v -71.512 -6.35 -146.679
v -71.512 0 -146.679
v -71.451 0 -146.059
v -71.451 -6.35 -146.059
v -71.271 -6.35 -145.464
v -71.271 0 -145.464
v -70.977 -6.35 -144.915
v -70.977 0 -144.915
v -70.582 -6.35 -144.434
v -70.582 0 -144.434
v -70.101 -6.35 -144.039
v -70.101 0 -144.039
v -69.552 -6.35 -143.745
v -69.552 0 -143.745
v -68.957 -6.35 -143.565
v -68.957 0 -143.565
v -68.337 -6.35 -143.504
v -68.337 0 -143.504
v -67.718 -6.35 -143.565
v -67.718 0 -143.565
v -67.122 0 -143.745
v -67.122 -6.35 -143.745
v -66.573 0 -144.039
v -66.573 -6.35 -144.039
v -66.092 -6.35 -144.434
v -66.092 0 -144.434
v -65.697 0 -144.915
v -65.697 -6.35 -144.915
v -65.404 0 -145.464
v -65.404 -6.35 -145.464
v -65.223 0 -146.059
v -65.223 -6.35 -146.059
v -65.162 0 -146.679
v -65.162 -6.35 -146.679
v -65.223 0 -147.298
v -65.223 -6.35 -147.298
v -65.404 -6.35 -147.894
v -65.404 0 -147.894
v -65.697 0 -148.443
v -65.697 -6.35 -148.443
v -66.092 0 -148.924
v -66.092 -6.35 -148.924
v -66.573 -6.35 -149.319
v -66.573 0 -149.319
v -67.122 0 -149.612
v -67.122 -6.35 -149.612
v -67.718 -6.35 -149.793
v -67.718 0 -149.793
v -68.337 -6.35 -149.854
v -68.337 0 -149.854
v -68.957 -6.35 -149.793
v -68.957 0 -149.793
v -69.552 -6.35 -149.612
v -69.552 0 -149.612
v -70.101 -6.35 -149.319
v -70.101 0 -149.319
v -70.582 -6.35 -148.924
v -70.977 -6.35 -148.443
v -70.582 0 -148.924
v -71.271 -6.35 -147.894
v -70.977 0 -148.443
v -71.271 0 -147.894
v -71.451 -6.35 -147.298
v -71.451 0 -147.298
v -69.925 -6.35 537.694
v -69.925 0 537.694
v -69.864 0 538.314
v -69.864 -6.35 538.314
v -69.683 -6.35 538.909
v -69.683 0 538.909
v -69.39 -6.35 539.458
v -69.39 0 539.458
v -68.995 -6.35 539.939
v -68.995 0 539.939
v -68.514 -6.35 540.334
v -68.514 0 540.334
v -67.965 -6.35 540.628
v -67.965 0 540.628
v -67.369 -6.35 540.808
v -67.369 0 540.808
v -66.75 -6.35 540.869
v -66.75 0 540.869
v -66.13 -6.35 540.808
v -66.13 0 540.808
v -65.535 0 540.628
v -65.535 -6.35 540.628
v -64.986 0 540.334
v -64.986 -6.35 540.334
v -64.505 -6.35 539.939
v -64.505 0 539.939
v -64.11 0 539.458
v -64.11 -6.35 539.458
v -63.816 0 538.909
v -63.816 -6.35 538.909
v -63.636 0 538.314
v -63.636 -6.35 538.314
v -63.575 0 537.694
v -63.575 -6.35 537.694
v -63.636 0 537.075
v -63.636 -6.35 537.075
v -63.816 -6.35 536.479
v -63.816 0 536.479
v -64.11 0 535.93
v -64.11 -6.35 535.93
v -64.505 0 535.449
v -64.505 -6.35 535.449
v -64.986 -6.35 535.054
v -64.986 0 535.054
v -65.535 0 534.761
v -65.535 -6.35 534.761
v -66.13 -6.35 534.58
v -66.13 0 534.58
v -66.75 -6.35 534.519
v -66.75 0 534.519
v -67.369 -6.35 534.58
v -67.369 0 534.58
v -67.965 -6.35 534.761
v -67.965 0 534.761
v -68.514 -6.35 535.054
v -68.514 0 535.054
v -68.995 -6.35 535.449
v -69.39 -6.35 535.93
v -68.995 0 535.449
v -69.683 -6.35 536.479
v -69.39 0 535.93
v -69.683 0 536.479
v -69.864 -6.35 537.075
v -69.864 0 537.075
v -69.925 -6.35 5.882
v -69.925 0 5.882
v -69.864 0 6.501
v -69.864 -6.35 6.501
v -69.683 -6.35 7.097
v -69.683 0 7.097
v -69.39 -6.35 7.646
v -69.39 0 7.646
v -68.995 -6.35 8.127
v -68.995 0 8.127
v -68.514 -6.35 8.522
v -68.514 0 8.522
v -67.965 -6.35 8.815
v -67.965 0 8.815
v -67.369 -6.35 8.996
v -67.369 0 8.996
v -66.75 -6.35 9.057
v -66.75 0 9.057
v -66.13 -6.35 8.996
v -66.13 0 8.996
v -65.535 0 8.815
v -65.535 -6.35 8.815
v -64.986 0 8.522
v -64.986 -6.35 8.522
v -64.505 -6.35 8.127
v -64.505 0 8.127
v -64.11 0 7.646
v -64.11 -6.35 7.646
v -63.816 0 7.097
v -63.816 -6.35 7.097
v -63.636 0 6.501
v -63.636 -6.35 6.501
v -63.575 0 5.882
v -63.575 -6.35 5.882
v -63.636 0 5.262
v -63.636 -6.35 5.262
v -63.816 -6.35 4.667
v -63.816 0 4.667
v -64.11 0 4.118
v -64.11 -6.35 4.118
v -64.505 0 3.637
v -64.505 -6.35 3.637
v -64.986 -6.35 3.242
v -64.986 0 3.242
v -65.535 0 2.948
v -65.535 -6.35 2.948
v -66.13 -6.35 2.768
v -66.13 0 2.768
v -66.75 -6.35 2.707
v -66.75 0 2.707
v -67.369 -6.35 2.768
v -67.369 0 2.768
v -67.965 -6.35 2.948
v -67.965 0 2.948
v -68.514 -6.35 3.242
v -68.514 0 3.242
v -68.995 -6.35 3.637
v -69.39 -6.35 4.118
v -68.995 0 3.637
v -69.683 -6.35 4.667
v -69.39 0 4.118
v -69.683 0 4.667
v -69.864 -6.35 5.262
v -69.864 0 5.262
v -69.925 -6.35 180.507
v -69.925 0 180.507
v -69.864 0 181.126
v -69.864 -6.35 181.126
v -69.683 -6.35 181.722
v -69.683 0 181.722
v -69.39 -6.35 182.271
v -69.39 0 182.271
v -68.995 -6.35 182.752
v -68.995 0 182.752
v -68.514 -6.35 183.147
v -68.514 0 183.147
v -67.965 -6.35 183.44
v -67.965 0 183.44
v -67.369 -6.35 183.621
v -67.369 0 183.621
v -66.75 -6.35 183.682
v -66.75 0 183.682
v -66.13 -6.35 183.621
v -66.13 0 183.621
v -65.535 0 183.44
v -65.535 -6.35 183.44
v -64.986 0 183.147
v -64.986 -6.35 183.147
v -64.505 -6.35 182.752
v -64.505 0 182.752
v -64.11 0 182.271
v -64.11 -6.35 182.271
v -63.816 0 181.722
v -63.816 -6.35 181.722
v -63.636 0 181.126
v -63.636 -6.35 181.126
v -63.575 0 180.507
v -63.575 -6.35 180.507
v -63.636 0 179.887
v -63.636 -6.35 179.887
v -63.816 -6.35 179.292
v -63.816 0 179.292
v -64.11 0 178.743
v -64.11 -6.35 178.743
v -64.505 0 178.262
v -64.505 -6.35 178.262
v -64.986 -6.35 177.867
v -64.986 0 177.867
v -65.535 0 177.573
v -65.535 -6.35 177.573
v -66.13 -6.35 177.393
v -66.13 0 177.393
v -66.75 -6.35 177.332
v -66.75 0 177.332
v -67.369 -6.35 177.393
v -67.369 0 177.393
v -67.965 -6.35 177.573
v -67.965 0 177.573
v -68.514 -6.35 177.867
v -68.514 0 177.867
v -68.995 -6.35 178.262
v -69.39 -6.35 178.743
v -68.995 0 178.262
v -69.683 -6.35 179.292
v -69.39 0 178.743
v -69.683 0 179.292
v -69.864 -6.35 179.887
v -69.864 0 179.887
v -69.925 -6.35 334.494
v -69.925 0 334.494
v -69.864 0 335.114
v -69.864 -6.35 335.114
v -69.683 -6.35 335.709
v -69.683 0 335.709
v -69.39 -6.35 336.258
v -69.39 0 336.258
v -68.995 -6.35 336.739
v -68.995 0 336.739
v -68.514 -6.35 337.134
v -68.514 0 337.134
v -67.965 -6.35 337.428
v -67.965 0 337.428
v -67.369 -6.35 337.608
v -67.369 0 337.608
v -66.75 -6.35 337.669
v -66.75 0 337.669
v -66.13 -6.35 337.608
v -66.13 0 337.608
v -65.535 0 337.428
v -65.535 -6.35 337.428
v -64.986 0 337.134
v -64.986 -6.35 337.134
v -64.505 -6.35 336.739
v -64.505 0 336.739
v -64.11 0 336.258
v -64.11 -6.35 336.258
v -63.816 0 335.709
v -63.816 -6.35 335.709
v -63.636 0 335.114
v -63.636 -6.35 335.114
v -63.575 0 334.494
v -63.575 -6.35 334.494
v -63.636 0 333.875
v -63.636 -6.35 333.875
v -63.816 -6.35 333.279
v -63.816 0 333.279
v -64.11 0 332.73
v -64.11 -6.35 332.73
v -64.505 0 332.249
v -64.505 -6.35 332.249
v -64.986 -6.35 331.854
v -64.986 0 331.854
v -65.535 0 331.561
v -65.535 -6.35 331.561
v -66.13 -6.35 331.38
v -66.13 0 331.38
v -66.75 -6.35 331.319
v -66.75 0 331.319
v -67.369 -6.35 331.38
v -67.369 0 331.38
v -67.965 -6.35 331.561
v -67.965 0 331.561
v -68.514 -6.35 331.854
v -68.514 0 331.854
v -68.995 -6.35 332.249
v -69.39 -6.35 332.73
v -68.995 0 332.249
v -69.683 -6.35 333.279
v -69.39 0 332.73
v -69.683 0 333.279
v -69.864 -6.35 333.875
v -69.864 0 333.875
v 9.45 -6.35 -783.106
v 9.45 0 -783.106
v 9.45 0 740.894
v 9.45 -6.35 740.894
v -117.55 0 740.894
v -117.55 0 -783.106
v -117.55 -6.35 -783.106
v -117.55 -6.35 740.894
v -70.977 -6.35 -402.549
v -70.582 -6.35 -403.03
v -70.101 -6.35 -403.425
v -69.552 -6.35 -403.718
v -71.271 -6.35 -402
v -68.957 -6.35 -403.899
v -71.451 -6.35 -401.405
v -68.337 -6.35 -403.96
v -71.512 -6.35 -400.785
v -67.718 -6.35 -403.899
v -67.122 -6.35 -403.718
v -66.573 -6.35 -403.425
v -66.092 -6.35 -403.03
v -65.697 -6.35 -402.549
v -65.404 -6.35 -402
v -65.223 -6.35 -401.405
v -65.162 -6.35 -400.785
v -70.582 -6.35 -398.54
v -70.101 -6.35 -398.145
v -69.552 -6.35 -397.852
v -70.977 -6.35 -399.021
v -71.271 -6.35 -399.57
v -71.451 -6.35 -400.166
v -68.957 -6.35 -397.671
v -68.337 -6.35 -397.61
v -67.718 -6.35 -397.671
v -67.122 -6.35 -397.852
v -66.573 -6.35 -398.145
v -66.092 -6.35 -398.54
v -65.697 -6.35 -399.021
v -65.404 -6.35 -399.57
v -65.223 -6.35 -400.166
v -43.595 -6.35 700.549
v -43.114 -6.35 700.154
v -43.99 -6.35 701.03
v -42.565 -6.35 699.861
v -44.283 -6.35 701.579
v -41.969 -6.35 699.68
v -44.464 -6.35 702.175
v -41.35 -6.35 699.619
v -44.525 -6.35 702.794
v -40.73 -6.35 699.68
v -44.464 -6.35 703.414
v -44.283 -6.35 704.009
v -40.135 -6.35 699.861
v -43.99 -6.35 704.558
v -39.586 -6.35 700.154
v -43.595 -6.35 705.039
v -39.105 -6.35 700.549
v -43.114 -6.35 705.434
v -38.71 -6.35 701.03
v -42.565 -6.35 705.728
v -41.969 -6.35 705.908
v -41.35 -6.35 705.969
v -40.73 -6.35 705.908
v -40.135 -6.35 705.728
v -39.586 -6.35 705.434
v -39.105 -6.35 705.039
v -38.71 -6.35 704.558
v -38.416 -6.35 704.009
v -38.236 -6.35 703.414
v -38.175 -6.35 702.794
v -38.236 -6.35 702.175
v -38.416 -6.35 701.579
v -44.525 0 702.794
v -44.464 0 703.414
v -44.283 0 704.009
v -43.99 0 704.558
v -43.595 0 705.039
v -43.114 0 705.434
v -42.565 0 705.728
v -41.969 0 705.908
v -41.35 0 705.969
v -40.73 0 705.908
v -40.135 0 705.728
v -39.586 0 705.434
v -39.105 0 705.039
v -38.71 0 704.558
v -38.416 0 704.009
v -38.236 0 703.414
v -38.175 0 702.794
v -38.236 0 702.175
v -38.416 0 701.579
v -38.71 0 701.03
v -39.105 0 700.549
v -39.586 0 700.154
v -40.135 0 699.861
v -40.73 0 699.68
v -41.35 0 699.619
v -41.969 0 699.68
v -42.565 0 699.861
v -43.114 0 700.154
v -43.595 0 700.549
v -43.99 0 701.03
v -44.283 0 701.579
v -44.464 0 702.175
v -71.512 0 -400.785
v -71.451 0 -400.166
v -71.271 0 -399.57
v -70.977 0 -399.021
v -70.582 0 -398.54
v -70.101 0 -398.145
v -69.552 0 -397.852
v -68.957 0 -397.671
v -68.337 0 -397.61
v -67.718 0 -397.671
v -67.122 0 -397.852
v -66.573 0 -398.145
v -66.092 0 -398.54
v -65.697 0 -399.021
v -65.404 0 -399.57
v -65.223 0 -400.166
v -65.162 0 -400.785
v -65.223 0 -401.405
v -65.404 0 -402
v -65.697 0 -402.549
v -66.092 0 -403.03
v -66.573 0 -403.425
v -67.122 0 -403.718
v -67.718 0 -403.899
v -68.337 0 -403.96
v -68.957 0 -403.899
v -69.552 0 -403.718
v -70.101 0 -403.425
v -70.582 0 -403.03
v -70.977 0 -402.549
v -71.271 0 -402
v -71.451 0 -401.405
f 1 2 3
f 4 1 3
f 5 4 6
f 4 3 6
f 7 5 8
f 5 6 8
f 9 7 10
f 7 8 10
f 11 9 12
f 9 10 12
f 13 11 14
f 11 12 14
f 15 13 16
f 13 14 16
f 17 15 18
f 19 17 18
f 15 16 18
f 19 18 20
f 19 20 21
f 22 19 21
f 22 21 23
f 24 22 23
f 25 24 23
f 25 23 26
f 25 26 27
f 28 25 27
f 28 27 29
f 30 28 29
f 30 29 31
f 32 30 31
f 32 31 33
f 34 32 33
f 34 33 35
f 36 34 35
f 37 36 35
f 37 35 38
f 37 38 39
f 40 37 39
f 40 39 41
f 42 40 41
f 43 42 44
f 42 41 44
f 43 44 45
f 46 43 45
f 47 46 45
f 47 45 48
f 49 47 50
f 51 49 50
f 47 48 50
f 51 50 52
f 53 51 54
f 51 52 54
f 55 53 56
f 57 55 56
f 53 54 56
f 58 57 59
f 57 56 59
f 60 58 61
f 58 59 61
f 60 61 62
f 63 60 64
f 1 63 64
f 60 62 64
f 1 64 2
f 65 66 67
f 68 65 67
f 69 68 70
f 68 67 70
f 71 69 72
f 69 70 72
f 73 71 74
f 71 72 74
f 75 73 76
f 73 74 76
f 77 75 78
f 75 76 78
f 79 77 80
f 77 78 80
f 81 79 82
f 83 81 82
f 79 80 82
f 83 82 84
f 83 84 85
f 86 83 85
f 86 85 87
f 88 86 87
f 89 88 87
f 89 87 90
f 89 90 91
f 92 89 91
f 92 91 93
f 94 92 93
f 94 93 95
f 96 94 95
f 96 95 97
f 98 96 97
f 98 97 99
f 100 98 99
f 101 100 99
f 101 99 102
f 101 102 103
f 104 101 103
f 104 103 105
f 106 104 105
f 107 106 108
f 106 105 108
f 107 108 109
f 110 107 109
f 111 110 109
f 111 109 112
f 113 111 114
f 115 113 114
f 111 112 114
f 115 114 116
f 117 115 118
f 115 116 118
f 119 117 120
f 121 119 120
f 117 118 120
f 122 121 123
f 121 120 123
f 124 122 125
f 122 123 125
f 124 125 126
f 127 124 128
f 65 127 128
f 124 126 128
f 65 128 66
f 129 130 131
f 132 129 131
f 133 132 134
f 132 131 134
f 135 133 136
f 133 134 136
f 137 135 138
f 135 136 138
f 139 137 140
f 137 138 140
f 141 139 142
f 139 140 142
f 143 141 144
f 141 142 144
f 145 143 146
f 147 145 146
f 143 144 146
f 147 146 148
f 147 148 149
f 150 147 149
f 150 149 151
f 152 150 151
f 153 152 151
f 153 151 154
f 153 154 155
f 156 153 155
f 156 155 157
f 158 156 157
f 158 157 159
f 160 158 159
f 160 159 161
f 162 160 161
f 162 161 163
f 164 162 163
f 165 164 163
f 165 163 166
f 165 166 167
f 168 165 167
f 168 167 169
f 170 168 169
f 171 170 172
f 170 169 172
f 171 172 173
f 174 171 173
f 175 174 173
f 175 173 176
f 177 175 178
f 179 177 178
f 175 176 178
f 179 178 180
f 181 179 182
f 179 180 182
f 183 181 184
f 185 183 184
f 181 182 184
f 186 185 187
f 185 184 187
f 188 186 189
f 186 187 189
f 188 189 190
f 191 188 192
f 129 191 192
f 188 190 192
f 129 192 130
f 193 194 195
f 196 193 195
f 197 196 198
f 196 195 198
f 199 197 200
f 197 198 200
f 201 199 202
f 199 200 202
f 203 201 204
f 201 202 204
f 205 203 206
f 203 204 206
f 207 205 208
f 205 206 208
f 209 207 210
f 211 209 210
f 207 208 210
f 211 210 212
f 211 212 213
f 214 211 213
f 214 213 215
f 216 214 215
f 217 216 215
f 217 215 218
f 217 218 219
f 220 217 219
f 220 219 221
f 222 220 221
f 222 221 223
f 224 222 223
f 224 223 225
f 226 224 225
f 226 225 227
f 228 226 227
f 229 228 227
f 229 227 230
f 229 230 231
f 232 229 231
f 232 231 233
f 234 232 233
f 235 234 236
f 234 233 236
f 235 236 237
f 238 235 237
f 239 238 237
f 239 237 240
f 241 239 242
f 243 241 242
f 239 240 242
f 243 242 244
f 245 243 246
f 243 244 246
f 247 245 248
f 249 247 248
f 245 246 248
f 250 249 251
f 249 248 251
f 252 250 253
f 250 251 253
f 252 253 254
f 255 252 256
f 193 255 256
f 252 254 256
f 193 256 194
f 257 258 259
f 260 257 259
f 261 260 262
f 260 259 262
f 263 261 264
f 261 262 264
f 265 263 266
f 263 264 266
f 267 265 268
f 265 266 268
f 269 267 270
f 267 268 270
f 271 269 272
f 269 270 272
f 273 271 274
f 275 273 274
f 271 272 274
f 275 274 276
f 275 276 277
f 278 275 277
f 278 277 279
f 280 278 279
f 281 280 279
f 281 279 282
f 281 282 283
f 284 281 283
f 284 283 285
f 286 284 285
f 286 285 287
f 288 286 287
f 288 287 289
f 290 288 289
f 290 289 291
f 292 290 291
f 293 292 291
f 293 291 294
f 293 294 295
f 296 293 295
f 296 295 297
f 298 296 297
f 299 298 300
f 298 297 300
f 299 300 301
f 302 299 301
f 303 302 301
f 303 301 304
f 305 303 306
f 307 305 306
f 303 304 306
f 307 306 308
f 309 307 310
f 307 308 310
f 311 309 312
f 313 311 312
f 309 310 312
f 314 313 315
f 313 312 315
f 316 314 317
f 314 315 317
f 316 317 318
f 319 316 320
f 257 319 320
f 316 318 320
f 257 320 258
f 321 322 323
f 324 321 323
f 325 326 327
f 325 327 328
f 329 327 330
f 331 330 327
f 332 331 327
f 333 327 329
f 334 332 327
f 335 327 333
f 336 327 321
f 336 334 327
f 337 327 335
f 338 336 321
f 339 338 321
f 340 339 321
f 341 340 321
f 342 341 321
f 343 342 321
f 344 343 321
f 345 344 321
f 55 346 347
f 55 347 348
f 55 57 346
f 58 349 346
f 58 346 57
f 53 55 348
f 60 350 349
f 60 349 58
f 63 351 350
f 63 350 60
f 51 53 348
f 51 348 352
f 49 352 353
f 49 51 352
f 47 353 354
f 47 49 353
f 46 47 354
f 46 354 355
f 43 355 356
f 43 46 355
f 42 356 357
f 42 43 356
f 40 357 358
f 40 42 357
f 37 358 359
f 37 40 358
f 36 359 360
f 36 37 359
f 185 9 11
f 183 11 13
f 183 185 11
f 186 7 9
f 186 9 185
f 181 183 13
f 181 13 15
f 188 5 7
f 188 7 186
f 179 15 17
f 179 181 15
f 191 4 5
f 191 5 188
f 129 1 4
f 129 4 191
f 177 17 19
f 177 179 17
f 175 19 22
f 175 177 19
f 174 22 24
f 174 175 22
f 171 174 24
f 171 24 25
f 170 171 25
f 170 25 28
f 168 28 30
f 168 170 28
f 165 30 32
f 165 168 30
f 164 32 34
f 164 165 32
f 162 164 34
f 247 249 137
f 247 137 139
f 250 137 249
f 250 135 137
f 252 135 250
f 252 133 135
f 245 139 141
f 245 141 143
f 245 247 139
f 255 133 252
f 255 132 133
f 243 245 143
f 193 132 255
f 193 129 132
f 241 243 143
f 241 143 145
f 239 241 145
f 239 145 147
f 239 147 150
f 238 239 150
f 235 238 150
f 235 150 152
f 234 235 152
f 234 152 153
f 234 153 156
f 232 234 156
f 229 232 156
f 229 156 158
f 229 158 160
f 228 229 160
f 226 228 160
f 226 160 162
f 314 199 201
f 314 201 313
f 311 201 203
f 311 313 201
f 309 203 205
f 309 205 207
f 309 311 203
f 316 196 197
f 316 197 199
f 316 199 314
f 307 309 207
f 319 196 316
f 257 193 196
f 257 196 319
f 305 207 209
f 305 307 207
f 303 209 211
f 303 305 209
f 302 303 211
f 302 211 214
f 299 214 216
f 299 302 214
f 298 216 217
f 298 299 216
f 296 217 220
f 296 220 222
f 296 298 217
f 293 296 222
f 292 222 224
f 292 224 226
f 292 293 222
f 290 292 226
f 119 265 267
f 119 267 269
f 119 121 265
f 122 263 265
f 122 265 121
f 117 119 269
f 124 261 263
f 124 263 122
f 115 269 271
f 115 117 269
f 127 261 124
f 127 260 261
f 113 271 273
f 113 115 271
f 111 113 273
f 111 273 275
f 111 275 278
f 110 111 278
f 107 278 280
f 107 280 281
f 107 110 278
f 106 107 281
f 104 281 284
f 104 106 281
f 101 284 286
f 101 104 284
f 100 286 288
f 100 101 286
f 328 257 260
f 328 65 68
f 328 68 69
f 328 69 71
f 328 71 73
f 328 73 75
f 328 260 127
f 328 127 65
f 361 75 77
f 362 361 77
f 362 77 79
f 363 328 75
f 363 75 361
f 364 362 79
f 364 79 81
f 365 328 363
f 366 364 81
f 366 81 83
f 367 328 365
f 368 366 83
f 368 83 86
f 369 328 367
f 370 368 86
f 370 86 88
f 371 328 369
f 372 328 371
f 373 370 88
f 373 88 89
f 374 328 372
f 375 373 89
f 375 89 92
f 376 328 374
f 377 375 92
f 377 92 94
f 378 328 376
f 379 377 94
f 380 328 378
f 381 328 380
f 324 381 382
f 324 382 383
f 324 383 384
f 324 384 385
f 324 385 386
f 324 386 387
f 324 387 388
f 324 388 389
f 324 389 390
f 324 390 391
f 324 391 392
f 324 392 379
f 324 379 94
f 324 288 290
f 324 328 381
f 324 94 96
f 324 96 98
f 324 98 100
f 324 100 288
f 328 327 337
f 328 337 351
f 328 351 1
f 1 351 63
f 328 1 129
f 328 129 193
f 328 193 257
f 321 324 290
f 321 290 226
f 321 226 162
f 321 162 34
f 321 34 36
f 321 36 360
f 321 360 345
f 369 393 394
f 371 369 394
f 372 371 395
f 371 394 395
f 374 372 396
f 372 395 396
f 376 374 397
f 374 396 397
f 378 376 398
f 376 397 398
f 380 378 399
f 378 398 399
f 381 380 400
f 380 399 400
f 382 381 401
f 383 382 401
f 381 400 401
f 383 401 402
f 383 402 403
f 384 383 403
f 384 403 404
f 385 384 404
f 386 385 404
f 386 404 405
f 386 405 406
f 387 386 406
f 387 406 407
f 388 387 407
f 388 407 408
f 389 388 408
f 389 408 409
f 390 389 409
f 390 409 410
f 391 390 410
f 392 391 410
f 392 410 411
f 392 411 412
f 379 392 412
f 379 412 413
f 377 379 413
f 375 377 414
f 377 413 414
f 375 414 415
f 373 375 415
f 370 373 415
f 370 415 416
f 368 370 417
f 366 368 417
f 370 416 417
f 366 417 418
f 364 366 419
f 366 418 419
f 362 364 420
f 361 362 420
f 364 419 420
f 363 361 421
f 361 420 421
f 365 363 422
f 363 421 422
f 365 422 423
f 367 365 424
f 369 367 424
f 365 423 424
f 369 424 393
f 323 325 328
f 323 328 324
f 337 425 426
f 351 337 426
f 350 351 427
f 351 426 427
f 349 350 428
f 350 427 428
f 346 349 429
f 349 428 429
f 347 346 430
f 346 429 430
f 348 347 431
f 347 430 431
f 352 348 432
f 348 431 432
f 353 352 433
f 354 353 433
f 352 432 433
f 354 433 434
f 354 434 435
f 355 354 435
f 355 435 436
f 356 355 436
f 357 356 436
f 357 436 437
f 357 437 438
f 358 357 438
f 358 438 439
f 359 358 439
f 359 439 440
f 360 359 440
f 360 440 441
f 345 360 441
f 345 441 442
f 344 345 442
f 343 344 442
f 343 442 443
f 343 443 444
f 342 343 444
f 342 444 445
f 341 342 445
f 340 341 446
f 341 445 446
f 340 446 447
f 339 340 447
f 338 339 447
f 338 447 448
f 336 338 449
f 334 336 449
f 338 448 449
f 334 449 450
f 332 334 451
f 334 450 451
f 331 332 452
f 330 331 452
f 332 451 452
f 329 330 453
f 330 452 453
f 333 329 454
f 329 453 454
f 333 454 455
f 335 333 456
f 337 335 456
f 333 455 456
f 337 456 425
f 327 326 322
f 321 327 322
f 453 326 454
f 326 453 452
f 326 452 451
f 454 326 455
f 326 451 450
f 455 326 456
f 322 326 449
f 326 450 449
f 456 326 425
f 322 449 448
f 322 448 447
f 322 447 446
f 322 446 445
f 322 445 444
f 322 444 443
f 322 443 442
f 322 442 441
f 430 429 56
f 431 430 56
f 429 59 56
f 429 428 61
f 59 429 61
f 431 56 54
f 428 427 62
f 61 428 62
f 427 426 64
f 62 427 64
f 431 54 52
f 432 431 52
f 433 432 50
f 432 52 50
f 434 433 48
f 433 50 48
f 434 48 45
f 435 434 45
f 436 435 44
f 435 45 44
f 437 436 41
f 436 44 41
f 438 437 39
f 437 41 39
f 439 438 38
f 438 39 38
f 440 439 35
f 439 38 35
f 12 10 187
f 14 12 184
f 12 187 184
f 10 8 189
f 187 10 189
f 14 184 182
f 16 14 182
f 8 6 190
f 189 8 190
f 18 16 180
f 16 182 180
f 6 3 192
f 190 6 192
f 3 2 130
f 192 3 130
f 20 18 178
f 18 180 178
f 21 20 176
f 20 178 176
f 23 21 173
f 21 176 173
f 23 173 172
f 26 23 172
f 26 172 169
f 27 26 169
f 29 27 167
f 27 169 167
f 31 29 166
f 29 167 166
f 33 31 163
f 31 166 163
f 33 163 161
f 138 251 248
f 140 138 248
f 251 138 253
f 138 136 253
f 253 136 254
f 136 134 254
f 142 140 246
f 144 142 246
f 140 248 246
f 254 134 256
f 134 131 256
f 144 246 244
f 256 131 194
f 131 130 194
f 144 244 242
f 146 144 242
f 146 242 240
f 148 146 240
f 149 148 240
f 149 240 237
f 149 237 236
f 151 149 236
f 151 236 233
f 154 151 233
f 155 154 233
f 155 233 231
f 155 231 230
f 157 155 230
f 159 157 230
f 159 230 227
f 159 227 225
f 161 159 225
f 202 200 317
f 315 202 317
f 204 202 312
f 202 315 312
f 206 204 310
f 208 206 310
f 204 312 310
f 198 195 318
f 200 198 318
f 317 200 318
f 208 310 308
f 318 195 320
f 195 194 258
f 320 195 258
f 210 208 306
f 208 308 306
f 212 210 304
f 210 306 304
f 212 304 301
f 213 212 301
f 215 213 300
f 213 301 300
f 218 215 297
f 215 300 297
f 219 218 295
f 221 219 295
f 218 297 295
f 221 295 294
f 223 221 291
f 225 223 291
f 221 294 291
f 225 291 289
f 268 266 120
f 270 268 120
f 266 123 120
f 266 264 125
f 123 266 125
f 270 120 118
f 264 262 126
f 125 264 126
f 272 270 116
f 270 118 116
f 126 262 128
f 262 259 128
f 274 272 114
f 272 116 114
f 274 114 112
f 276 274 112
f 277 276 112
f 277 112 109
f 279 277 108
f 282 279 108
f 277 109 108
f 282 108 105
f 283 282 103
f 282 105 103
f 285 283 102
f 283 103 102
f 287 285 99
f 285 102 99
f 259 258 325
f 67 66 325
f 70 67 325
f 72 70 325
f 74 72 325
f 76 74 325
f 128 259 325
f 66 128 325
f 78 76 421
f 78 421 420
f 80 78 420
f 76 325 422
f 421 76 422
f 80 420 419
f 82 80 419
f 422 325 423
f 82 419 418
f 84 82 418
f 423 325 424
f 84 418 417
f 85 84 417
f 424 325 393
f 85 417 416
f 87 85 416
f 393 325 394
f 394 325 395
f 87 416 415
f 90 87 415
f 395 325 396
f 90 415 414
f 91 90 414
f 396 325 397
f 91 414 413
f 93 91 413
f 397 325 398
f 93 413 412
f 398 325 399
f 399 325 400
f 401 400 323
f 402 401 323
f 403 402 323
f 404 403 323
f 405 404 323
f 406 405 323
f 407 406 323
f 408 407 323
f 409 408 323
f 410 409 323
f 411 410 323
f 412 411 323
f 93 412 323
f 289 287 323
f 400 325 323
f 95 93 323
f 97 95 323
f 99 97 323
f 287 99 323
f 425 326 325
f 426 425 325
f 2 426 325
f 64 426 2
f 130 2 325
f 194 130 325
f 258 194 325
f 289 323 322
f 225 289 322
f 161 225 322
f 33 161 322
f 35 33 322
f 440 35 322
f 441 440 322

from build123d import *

# Parameters (mm, degrees)
F0_W     = 127
F0_H     = 1524
F1_DEPTH = 6.35
F3_D     = 6.35
F5_D     = 6.35
F7_D     = 6.35
F9_D     = 6.35
F11_D    = 6.35
F13_D    = 6.35
F15_D    = 6.35


with BuildPart() as f1:
    # F0 (on Front) → F1 (new body)
    with BuildSketch(Plane.XZ):
        with Locations((-54.04981, -21.105763)):
            Rectangle(F0_W, F0_H)
    extrude(amount=F1_DEPTH)

    # F3 (through all)
    with Locations(Plane.XZ.offset(6.35)):
        with Locations((-41.34981, 702.794237)):
            Hole(F3_D / 2)

    # F5 (through all)
    with Locations(Plane.XZ.offset(6.35)):
        with Locations((-66.74981, 537.694237)):
            Hole(F5_D / 2)

    # F7 (through all)
    with Locations(Plane.XZ.offset(6.35)):
        with Locations((-66.74981, 334.494237)):
            Hole(F7_D / 2)

    # F9 (through all)
    with Locations(Plane.XZ.offset(6.35)):
        with Locations((-66.74981, 180.506737)):
            Hole(F9_D / 2)

    # F11 (through all)
    with Locations(Plane.XZ.offset(6.35)):
        with Locations((-66.74981, 5.881737)):
            Hole(F11_D / 2)

    # F13 (through all)
    with Locations(Plane.XZ.offset(6.35)):
        with Locations((-68.33731, -146.678616)):
            Hole(F13_D / 2)

    # F15 (through all)
    with Locations(Plane.XZ.offset(6.35)):
        with Locations((-68.33731, -400.785135)):
            Hole(F15_D / 2)


solid = f1.part
